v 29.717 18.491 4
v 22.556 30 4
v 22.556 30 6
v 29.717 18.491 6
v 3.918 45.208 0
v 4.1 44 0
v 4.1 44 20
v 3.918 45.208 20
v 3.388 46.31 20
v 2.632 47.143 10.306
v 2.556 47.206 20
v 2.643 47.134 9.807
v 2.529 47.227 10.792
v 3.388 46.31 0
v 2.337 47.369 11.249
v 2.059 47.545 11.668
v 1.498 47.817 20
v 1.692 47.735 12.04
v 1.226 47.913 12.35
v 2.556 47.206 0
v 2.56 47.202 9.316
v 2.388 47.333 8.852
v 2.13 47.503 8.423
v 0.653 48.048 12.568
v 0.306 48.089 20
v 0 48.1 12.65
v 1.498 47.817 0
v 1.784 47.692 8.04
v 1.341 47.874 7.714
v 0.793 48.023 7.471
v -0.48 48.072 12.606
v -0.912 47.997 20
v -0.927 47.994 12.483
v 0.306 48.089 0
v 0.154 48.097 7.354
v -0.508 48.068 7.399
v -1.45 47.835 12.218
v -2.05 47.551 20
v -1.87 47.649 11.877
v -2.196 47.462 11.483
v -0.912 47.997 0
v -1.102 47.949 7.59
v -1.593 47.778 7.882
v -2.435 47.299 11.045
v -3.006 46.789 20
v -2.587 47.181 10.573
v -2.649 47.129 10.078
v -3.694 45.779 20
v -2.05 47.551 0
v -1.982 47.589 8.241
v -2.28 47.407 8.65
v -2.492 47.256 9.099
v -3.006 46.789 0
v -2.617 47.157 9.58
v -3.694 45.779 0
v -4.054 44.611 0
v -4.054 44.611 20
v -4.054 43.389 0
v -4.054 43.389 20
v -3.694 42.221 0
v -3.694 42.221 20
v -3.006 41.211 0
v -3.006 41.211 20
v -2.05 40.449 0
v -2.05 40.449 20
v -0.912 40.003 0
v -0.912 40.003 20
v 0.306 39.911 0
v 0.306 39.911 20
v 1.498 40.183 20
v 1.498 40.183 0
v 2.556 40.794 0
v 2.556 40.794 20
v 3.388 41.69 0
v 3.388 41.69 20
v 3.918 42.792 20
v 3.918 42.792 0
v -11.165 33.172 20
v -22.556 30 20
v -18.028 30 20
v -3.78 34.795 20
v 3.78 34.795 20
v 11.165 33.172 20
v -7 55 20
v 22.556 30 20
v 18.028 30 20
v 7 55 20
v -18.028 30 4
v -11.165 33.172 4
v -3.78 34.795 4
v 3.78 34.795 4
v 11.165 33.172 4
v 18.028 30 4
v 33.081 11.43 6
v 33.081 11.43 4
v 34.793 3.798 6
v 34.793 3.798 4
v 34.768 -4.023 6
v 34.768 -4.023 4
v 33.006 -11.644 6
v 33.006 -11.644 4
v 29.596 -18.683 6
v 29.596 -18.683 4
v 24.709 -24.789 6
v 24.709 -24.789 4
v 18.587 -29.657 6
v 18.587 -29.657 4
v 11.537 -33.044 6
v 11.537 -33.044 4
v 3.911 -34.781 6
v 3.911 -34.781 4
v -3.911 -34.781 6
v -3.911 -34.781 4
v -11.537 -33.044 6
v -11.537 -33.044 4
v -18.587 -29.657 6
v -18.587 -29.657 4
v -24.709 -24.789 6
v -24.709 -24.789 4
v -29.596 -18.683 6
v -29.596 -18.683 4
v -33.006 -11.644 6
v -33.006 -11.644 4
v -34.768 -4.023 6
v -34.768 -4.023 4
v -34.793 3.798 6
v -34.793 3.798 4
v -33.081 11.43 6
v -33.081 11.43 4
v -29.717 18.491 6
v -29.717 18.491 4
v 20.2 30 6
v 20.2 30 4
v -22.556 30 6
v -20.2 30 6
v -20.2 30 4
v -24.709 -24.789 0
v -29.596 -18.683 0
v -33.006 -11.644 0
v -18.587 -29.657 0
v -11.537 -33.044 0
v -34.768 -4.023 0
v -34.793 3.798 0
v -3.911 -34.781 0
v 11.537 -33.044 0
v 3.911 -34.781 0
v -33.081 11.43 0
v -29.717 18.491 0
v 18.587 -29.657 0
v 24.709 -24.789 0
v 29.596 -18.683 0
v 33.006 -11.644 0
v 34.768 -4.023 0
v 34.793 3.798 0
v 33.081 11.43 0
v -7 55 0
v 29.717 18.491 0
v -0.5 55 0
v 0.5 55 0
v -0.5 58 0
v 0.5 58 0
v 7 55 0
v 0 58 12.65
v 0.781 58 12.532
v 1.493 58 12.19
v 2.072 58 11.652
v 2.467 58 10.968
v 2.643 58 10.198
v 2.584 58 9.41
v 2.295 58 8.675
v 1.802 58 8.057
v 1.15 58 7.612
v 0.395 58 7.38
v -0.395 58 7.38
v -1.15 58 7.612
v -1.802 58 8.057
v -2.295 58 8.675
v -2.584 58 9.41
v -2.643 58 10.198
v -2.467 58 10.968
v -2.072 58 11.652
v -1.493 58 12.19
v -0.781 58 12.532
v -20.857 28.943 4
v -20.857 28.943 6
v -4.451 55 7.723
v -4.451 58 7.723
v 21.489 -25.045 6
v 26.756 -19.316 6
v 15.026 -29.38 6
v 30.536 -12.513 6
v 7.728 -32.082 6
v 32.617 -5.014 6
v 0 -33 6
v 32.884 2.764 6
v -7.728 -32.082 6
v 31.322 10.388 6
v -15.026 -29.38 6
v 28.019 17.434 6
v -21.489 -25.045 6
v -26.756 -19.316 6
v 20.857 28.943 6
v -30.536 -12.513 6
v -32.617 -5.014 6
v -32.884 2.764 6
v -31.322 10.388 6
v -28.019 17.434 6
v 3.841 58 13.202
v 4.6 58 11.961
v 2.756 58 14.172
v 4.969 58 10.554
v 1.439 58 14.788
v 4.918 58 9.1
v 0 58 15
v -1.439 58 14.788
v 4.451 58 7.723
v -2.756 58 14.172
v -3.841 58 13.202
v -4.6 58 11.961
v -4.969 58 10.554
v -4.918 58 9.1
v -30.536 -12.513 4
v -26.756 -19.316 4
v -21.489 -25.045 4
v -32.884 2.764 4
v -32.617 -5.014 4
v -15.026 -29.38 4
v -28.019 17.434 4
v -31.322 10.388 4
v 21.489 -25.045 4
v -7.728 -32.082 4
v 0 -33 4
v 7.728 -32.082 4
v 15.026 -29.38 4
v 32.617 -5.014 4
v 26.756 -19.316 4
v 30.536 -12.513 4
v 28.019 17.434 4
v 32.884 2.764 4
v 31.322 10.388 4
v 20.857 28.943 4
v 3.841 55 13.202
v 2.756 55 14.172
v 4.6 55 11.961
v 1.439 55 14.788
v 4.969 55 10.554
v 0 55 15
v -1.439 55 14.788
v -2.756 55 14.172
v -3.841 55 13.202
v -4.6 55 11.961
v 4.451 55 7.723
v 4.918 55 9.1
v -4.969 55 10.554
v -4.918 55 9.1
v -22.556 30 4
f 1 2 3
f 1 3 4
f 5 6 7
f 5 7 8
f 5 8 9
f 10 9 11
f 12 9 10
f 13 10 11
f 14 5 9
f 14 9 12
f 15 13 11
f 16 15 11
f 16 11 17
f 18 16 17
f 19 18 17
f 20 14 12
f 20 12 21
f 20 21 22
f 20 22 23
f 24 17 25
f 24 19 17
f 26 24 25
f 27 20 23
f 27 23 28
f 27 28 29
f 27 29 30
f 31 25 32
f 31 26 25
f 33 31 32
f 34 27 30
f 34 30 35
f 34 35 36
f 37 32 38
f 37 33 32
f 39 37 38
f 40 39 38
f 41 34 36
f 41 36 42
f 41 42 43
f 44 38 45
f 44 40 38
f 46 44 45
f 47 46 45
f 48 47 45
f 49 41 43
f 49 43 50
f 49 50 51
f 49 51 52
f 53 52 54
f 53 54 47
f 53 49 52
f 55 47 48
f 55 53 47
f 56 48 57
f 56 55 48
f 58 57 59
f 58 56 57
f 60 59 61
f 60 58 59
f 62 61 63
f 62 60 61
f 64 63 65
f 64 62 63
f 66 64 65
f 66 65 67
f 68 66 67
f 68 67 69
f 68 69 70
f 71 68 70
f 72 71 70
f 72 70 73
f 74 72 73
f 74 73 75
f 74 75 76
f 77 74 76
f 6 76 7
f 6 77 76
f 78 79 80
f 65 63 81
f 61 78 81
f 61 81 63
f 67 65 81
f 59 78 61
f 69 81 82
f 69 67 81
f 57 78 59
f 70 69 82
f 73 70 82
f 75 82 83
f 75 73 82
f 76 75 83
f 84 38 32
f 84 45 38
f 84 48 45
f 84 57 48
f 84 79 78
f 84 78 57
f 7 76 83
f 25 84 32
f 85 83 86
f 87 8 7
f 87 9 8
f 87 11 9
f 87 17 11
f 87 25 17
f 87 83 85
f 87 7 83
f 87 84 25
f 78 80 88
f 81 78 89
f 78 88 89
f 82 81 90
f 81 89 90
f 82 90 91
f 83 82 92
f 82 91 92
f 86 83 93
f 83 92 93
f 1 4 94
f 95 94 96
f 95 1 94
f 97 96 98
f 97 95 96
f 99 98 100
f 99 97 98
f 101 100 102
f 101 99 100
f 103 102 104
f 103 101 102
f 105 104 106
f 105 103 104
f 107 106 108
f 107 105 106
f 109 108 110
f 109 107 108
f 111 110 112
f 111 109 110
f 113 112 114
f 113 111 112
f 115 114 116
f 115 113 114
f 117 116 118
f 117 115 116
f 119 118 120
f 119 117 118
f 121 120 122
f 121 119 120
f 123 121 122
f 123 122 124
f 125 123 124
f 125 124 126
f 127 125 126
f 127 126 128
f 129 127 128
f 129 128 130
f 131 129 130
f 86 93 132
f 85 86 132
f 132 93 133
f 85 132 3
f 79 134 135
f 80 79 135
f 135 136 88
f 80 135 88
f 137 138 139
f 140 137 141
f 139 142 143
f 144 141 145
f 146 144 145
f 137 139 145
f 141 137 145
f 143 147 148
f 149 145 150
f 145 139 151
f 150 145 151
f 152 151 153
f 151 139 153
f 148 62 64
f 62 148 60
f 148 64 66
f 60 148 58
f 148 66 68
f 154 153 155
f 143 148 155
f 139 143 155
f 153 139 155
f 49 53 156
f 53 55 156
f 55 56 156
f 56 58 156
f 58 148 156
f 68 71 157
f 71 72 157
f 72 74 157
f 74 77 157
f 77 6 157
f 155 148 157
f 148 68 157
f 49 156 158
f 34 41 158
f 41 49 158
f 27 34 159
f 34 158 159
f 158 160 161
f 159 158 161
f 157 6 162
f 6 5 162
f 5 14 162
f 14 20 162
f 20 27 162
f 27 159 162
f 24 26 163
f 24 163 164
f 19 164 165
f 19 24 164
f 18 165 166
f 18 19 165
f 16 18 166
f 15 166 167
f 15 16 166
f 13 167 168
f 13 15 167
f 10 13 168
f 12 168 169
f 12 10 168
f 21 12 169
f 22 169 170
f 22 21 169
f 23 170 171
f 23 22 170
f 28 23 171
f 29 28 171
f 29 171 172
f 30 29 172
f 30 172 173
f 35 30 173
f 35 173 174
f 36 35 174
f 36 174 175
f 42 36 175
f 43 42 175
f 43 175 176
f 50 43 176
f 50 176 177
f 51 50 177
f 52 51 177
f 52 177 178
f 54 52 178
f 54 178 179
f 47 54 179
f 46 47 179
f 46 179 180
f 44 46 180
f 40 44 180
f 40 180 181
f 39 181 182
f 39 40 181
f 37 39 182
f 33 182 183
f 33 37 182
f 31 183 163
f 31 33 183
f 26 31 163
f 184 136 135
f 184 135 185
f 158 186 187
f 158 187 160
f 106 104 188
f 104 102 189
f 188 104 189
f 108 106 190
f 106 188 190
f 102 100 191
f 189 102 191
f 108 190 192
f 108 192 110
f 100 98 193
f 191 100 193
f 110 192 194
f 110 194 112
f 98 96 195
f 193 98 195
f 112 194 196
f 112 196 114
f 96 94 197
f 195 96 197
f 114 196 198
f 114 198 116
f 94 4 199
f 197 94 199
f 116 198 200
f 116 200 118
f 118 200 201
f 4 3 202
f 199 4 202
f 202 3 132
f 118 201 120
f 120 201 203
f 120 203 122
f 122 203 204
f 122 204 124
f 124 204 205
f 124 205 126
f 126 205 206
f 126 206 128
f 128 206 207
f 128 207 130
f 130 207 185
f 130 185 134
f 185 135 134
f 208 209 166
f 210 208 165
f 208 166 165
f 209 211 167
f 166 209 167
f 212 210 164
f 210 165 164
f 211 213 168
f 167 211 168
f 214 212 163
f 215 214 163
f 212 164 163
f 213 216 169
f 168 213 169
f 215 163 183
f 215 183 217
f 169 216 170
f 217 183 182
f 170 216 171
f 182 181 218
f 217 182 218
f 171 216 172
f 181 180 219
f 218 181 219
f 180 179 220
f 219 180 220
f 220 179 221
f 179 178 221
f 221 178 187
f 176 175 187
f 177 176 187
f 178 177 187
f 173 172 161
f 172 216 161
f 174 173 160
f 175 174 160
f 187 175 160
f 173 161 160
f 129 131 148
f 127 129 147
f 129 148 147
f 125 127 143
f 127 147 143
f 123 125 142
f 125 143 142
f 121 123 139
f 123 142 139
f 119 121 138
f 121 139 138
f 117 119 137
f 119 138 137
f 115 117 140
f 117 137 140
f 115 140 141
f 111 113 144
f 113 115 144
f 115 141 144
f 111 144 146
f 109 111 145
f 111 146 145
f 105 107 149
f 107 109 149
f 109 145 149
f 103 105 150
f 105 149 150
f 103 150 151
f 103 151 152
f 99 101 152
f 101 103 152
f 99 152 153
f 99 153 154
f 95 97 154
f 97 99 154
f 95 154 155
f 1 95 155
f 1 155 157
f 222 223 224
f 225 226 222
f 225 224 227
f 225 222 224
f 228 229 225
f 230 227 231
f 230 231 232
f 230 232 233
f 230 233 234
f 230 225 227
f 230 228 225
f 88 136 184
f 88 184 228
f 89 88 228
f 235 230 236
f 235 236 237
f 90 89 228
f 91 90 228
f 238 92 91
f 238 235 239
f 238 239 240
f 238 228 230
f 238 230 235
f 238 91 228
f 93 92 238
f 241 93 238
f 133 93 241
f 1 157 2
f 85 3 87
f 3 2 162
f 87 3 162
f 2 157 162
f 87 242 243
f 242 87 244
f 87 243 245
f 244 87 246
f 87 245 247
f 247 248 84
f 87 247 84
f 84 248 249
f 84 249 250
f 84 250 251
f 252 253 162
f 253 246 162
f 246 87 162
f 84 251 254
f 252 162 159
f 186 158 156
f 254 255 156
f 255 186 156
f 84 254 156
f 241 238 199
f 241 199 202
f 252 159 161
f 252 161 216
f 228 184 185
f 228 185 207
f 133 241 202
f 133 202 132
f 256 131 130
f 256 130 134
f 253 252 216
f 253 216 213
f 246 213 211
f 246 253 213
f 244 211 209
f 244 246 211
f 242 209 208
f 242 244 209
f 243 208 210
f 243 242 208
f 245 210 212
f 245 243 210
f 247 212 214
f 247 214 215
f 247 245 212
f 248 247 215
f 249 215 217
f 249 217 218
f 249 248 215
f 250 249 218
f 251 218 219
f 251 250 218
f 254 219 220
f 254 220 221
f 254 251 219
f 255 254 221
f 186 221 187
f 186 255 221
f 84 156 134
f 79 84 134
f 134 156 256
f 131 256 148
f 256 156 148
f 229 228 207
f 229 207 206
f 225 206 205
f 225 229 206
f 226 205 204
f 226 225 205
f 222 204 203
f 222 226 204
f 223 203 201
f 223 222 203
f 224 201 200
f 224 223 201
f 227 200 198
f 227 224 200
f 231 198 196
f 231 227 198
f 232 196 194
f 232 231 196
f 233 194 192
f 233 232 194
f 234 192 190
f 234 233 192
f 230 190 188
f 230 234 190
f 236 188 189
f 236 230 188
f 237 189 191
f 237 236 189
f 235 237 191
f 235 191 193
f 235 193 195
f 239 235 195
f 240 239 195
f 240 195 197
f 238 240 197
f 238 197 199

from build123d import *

# Parameters (mm, degrees)
CROQUIS1_R              = 35
SALIENTE_EXTRUIR1_DEPTH = 4
SALIENTE_EXTRUIR2_START = -4
CROQUIS2_R              = 4.1
SALIENTE_EXTRUIR2_DEPTH = 4
CROQUIS4_R              = 4.1
SALIENTE_EXTRUIR5_DEPTH = 16
CROQUIS7_W              = 70
CROQUIS7_H              = 60
CORTAR_EXTRUIR2_DEPTH   = 68.126745787
SALIENTE_EXTRUIR6_DEPTH = 2
CROQUIS12_R             = 2.65
SALIENTE_EXTRUIR8_DEPTH = 3
CORTAR_EXTRUIR5_START   = -16
CROQUIS13_R             = 2.65
CORTAR_EXTRUIR5_DEPTH   = 16


with BuildPart() as part:
    # Croquis1 → Saliente-Extruir1 (new body)
    with BuildSketch(Plane.XY):
        Circle(CROQUIS1_R)
    extrude(amount=SALIENTE_EXTRUIR1_DEPTH)

    # Croquis2 → Saliente-Extruir2 (add)
    with BuildSketch(Plane.XY.offset(4).offset(SALIENTE_EXTRUIR2_START)):
        with BuildLine():
            Line((29.716981132, 18.490566038), (7, 55))
            Line((7, 55), (-7, 55))
            Line((-7, 55), (-29.716981132, 18.490566038))
            ThreePointArc((-29.716981132, 18.490566038), (0, 35), (29.716981132, 18.490566038))
        make_face()
        with Locations((0, 44)):
            Circle(CROQUIS2_R, mode=Mode.SUBTRACT)
    extrude(amount=SALIENTE_EXTRUIR2_DEPTH)

    # Croquis4 → Saliente-Extruir5 (add)
    with BuildSketch(Plane.XY.offset(4)):
        with BuildLine():
            Line((29.716981132, 18.490566038), (7, 55))
            Line((7, 55), (-7, 55))
            Line((-7, 55), (-29.716981132, 18.490566038))
            ThreePointArc((-29.716981132, 18.490566038), (0, 35), (29.716981132, 18.490566038))
        make_face()
        with Locations((0, 44)):
            Circle(CROQUIS4_R, mode=Mode.SUBTRACT)
    extrude(amount=SALIENTE_EXTRUIR5_DEPTH)

    # Croquis7 → Cortar-Extruir2 (cut, through all)
    with BuildSketch(Plane.XY.offset(4)):
        Rectangle(CROQUIS7_W, CROQUIS7_H)
    extrude(amount=CORTAR_EXTRUIR2_DEPTH, mode=Mode.SUBTRACT)

    # Croquis8 → Saliente-Extruir6 (add)
    with BuildSketch(Plane.XY.offset(4)):
        with BuildLine():
            Line((-20.857442348, 28.943396226), (-28.018867925, 17.433962264))
            ThreePointArc((-28.018867925, 17.433962264), (0, -33), (28.018867925, 17.433962264))
            Line((28.018867925, 17.433962264), (20.857442348, 28.943396226))
            Line((20.857442348, 28.943396226), (20.2, 30))
            Line((20.2, 30), (22.555555556, 30))
            Line((22.555555556, 30), (29.716981132, 18.490566038))
            ThreePointArc((29.716981132, 18.490566038), (0, -35), (-29.716981132, 18.490566038))
            Line((-29.716981132, 18.490566038), (-22.555555556, 30))
            Line((-22.555555556, 30), (-20.2, 30))
            Line((-20.2, 30), (-20.857442348, 28.943396226))
        make_face()
    extrude(amount=SALIENTE_EXTRUIR6_DEPTH)

    # Croquis12 → Saliente-Extruir8 (add)
    with BuildSketch(Plane(origin=(0, 55, 0), x_dir=(1, 0, 0), z_dir=(0, 1, 0))):
        with BuildLine():
            Line((-4.451209869, -7.722560493), (-0.5, 0))
            Line((-0.5, 0), (0.5, 0))
            Line((0.5, 0), (4.451209869, -7.722560493))
            ThreePointArc((4.451209869, -7.722560493), (0, -15), (-4.451209869, -7.722560493))
        make_face()
        with Locations(Location((0, -10, 0), (0, 0, 270))):
            Circle(CROQUIS12_R, mode=Mode.SUBTRACT)
    extrude(amount=SALIENTE_EXTRUIR8_DEPTH)

    # Croquis13 → Cortar-Extruir5 (cut)
    with BuildSketch(Plane(origin=(0, 58, 0), x_dir=(1, 0, 0), z_dir=(0, 1, 0)).offset(CORTAR_EXTRUIR5_START)):
        with Locations(Location((0, -10, 0), (0, 0, 270))):
            Circle(CROQUIS13_R)
    extrude(amount=CORTAR_EXTRUIR5_DEPTH, mode=Mode.SUBTRACT)


solid = part.part
